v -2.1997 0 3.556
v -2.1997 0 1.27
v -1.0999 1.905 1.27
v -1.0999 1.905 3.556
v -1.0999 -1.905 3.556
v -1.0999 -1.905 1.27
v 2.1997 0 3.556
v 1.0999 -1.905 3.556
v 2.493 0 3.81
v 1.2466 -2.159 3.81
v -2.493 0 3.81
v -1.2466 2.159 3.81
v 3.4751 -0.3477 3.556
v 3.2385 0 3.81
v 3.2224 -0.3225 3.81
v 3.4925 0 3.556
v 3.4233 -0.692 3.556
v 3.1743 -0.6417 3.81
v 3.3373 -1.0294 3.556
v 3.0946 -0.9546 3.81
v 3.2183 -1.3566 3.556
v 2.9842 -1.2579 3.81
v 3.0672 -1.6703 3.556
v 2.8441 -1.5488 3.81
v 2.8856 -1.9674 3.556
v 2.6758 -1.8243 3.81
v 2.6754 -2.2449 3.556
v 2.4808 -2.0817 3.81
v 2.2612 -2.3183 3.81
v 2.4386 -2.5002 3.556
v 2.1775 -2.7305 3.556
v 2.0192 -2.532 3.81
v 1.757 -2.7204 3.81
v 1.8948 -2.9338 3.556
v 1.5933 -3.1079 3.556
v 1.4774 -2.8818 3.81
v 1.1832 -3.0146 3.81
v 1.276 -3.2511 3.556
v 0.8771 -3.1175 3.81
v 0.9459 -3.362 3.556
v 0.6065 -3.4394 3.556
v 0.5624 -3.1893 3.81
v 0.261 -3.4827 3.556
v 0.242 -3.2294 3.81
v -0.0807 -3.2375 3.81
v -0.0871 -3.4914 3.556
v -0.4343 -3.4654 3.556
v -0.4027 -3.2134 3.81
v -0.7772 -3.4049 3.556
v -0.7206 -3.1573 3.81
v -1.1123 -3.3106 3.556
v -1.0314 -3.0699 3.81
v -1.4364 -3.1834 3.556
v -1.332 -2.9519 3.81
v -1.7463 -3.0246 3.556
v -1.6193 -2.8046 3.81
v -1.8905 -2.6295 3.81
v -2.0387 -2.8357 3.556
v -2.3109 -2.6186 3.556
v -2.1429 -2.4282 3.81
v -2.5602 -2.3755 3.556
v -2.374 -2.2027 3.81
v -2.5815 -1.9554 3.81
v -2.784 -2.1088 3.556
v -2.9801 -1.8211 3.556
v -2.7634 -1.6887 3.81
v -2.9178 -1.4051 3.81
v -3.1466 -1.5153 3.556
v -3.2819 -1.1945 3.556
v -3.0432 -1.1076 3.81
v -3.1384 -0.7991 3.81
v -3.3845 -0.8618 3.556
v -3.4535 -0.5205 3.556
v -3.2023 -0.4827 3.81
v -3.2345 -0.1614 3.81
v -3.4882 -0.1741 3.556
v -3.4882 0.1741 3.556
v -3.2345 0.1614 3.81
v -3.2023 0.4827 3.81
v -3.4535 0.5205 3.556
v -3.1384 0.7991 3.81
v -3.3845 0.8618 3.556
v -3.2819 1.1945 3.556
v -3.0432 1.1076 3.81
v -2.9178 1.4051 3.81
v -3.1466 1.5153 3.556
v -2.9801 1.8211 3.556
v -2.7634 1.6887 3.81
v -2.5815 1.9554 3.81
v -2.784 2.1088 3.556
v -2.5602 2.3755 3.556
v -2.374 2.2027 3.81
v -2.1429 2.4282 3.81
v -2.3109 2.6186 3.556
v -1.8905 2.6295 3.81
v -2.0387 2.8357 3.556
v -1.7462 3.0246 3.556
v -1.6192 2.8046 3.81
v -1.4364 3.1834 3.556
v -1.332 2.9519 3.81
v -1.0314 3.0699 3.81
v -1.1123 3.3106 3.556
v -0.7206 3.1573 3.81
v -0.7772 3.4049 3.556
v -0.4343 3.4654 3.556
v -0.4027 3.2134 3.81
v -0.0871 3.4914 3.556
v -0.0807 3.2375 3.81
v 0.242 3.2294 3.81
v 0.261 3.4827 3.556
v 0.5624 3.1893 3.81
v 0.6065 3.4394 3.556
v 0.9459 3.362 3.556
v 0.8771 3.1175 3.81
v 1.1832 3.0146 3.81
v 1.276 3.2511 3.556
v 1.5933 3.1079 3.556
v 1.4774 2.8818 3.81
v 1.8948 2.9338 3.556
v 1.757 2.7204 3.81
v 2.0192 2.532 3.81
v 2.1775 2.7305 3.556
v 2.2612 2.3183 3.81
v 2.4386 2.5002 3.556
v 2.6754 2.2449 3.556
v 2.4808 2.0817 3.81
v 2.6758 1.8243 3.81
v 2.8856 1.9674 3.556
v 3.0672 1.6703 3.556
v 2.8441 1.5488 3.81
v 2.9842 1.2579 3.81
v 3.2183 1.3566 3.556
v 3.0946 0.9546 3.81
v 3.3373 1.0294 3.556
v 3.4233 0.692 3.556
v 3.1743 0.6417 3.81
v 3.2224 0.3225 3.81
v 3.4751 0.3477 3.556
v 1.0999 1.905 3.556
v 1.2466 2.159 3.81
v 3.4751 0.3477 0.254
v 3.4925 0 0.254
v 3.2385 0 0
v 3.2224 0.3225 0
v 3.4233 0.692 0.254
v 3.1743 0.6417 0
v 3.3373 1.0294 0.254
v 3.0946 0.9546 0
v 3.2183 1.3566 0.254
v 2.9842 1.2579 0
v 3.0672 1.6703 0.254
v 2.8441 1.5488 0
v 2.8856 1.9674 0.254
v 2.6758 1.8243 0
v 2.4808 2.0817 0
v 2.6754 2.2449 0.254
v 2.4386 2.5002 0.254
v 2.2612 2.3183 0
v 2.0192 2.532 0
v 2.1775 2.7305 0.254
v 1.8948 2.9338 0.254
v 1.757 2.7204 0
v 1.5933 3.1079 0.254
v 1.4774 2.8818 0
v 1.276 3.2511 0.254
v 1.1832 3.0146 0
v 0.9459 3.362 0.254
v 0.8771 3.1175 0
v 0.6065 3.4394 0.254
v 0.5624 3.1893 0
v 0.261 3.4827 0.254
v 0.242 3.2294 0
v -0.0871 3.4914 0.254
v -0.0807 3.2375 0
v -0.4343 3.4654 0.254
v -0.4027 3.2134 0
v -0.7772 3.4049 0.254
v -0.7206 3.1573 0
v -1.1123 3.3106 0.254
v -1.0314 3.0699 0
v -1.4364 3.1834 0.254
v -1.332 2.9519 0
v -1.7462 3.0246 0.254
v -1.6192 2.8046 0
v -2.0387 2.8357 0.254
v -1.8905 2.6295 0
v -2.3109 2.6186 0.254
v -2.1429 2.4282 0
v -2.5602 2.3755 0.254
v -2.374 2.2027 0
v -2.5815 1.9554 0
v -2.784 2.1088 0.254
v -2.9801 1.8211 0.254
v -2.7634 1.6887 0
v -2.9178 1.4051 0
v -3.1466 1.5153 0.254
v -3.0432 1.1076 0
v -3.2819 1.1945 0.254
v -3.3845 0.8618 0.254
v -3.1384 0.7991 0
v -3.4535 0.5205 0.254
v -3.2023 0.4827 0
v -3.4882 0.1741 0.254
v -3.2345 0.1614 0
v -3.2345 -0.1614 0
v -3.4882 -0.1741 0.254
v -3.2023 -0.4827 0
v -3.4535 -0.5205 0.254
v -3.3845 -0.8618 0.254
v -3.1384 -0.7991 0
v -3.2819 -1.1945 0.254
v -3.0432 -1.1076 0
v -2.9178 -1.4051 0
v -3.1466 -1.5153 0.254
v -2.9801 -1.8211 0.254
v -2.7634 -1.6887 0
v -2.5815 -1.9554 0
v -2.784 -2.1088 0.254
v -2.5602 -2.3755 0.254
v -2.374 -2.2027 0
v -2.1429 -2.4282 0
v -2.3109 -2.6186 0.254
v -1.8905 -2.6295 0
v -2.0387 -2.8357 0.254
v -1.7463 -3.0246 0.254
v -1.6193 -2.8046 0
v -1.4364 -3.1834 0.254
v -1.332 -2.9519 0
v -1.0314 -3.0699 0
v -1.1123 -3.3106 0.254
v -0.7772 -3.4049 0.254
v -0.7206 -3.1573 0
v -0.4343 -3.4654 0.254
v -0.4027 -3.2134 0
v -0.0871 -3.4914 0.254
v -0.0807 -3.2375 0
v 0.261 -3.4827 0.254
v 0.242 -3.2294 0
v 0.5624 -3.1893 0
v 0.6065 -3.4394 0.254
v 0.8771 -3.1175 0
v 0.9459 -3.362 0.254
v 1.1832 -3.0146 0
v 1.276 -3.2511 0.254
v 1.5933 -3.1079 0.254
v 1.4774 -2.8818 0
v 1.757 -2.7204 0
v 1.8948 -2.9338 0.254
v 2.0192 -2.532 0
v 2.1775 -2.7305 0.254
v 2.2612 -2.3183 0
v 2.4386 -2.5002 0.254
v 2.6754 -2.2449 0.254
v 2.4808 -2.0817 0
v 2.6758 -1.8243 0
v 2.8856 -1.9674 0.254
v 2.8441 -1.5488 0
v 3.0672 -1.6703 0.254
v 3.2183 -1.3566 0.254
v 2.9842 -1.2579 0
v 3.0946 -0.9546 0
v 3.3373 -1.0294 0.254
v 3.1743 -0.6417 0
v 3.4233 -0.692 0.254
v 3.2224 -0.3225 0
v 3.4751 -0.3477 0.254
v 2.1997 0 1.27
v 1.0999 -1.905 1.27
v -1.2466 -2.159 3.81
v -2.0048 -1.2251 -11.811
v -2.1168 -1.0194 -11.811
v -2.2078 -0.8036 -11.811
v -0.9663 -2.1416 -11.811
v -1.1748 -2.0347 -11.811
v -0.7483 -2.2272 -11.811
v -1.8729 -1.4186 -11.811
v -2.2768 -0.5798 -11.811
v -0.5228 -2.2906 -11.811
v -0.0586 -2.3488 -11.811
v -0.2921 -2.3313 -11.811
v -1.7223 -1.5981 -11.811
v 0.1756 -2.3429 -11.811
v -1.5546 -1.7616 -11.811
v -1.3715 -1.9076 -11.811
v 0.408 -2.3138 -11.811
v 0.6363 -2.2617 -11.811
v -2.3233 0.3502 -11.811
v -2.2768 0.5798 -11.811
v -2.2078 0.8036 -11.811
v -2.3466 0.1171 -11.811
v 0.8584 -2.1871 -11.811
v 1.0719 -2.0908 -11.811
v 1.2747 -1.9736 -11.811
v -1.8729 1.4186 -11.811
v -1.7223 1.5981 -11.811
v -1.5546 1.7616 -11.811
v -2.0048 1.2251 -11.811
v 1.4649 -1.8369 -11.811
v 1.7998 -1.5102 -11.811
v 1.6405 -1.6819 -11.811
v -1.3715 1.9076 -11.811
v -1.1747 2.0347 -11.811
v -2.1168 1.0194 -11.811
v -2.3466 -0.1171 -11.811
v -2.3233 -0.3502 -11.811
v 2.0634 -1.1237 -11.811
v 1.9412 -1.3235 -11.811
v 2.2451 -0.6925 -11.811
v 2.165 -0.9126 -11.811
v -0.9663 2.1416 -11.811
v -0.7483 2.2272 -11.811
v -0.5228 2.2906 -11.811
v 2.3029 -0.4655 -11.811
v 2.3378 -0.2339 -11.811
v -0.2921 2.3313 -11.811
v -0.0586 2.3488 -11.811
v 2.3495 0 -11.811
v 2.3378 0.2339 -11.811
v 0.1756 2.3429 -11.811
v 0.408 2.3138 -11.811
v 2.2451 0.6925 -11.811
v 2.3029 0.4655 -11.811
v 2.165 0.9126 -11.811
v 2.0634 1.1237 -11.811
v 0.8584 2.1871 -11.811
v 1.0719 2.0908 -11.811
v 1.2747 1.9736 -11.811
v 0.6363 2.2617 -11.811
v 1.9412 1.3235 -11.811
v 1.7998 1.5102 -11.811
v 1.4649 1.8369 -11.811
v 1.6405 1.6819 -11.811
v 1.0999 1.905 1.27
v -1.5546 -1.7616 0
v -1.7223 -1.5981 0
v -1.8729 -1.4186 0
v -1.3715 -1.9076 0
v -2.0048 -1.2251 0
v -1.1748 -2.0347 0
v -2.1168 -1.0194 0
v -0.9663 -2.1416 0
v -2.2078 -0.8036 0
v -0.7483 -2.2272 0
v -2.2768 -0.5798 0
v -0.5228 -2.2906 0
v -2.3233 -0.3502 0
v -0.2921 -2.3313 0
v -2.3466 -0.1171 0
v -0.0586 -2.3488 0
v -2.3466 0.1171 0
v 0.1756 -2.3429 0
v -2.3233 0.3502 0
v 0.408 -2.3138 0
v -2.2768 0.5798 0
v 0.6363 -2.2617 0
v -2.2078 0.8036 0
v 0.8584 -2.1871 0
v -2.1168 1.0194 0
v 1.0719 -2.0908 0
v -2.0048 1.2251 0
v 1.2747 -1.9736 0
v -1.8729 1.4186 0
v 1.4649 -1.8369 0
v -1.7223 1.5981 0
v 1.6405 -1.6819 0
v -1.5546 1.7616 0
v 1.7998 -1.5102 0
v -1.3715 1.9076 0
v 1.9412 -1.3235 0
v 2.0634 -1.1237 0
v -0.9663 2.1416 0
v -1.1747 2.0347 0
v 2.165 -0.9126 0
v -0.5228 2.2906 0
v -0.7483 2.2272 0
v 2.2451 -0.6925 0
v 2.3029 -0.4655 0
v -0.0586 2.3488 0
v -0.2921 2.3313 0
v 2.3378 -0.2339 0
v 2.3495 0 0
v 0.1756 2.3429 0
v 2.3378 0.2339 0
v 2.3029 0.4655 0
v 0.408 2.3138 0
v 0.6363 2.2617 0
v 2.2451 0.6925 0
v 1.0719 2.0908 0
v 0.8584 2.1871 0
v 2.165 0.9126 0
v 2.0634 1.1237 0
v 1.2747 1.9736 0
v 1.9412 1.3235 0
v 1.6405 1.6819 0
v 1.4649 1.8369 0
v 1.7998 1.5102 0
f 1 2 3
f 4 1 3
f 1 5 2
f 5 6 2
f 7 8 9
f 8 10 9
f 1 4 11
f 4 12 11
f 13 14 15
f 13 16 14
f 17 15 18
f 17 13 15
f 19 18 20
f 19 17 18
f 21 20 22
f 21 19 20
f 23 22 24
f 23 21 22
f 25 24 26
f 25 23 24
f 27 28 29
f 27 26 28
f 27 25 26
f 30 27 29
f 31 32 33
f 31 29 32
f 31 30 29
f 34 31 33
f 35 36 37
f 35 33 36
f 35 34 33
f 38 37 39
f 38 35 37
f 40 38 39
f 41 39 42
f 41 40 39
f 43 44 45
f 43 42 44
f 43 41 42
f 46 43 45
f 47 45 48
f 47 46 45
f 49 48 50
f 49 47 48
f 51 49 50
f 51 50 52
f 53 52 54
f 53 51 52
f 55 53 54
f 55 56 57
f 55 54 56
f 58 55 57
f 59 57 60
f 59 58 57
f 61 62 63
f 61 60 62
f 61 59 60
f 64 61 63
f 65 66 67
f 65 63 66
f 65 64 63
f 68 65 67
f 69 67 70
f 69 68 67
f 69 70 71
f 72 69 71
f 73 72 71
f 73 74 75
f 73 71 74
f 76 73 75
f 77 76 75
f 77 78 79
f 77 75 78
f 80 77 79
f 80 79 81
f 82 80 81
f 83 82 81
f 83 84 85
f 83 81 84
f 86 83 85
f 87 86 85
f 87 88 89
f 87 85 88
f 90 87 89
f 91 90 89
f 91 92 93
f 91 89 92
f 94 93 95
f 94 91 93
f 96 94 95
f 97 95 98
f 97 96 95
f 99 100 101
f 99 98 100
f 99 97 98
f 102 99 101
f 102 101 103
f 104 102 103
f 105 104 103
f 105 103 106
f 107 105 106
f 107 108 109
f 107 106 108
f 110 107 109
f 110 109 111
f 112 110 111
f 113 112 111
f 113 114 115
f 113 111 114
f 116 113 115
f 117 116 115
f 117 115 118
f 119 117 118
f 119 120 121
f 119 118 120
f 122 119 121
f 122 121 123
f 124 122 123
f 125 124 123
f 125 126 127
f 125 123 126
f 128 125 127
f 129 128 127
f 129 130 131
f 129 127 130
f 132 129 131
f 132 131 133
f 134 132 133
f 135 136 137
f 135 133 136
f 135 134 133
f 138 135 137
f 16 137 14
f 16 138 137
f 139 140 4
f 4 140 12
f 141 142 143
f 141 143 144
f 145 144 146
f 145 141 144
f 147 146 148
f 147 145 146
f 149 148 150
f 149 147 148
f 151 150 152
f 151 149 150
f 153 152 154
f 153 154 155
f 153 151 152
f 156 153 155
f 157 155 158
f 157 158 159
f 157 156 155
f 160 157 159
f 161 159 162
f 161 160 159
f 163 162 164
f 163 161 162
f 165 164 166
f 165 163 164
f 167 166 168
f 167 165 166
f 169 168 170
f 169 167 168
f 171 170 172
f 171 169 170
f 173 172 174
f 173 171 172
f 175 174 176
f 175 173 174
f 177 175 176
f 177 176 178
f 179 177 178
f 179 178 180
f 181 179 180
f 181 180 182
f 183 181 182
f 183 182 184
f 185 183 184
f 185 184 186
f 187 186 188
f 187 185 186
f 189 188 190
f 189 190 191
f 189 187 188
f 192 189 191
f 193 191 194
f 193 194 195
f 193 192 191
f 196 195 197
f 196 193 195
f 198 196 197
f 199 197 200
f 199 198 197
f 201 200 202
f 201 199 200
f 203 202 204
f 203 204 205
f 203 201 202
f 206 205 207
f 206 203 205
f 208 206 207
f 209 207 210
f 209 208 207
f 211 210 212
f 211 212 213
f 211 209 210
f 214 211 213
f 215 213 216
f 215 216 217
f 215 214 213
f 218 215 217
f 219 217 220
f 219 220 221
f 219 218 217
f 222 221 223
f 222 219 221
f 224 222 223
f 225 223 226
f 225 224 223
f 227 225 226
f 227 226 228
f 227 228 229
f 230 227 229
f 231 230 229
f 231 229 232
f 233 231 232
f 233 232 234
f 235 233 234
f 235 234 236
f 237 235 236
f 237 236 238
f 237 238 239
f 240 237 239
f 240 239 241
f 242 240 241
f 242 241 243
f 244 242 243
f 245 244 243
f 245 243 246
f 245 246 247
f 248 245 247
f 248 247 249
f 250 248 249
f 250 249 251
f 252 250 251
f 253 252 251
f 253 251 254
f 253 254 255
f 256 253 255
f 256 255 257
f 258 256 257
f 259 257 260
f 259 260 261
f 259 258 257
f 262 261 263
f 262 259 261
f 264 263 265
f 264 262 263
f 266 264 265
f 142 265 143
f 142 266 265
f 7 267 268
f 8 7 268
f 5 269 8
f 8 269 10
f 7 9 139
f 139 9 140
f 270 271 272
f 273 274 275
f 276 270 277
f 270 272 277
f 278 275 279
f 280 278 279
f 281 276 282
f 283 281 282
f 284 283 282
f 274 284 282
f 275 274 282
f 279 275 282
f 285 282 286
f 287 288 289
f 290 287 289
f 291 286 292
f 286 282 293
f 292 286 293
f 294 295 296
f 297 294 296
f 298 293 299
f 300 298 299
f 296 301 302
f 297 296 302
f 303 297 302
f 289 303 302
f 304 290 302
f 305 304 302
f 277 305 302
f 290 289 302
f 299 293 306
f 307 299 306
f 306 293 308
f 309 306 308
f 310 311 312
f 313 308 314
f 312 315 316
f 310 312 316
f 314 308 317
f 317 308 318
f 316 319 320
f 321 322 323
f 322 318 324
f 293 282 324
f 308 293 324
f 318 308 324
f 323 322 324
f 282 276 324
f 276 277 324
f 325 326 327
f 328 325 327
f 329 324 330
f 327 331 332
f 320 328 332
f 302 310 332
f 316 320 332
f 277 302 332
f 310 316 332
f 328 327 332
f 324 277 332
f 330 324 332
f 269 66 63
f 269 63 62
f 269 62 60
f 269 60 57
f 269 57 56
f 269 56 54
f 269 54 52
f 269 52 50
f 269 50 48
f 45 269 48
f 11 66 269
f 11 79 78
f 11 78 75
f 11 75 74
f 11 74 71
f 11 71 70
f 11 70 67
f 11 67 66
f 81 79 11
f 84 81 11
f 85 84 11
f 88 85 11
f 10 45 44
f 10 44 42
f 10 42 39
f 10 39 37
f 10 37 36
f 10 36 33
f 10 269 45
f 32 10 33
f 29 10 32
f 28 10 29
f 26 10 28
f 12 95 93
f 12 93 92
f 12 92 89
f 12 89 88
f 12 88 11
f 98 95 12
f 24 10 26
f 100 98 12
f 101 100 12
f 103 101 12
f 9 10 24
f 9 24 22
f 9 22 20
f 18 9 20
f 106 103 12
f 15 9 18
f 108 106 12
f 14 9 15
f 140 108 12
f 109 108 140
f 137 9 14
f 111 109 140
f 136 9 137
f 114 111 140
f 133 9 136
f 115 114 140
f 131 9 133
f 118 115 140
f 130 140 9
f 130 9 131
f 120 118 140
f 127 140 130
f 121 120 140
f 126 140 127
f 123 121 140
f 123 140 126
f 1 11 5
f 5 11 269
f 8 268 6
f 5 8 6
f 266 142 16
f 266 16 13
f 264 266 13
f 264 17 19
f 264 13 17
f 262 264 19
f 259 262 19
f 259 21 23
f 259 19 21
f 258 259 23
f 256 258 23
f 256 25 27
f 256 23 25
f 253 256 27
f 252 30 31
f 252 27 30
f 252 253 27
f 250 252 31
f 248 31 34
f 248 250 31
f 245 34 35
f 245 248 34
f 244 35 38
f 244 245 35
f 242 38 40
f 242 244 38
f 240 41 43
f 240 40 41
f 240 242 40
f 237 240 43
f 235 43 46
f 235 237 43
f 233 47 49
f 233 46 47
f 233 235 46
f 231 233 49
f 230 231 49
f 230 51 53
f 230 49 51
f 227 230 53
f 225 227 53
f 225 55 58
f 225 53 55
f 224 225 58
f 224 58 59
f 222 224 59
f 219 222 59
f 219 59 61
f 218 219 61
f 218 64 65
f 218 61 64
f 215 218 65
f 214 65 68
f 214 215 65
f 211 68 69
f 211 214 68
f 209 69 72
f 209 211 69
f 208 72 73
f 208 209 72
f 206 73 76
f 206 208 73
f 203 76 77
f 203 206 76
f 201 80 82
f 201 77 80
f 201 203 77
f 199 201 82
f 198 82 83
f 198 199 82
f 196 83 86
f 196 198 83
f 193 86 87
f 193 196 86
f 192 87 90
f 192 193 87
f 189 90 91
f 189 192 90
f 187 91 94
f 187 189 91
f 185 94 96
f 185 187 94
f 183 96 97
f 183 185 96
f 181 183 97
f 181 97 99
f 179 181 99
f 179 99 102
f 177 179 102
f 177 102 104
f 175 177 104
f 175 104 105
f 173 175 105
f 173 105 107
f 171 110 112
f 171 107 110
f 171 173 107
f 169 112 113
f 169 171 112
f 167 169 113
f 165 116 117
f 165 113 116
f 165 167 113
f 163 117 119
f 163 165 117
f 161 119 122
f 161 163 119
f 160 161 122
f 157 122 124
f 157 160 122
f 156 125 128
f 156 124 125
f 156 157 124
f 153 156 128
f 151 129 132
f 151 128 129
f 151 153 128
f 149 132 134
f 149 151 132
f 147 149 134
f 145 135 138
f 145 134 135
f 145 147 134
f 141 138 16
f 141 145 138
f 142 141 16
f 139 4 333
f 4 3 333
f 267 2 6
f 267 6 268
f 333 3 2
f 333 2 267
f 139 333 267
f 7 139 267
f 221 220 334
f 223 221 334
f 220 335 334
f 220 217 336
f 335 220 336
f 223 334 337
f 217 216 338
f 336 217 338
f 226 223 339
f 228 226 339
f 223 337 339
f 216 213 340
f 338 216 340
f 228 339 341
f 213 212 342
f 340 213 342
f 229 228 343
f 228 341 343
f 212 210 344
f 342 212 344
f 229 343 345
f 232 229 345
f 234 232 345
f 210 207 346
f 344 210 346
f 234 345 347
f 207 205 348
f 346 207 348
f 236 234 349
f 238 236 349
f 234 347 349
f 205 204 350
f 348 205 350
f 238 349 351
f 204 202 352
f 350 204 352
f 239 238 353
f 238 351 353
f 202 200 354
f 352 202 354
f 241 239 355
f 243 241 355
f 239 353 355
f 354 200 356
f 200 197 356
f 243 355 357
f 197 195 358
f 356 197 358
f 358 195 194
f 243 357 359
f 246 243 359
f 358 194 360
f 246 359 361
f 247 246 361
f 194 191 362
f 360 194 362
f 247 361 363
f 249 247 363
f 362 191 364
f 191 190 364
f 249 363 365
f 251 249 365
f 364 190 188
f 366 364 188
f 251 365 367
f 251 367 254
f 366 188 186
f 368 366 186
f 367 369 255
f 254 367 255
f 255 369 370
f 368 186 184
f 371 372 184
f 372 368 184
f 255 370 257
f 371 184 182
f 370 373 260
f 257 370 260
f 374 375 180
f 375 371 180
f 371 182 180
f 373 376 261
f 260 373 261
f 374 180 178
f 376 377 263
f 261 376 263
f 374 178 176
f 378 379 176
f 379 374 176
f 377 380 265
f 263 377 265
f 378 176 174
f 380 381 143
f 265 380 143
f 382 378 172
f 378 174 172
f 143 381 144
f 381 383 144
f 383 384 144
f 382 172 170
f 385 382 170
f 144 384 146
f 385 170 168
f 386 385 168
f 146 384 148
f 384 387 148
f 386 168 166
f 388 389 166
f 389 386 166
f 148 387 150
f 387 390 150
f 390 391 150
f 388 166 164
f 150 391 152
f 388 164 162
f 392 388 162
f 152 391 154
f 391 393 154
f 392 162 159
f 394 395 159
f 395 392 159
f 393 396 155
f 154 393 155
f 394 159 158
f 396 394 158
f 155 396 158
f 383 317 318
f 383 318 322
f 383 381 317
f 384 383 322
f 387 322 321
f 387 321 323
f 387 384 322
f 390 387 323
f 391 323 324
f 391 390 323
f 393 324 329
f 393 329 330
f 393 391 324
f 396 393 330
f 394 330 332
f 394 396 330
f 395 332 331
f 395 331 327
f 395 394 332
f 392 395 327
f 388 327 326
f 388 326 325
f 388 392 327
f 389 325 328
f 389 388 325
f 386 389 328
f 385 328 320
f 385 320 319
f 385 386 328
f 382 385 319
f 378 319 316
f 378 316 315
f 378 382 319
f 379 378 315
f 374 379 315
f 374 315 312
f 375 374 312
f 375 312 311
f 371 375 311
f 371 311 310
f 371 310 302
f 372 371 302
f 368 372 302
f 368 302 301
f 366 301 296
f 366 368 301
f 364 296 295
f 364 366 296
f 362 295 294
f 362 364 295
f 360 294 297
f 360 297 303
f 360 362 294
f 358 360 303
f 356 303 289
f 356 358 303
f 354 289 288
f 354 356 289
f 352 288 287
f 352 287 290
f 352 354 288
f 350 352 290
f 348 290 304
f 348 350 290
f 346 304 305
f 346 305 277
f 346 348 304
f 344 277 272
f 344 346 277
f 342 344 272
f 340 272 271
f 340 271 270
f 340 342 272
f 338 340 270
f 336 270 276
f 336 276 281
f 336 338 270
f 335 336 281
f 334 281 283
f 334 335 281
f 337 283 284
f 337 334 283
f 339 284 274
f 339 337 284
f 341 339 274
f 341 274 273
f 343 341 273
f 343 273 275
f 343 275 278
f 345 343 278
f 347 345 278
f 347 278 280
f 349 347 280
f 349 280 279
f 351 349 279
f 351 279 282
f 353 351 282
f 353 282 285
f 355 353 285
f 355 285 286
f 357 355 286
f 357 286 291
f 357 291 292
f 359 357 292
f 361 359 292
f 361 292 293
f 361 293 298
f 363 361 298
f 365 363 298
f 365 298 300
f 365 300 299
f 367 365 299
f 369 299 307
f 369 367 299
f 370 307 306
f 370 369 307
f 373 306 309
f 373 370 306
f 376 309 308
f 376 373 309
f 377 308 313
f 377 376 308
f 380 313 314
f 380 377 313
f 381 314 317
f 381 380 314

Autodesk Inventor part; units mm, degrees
ref_plane "YZ Plane" through (0, 0, 0) normal (1, 0, 0) x (0, 1, 0)
ref_plane "XZ Plane" through (0, 0, 0) normal (0, 1, 0) x (-1, 0, 0)
ref_plane "XY Plane" through (0, 0, 0) normal (0, 0, 1) x (1, 0, 0)
sketch "Sketch1" plane through (0, 0, 0) normal (0, 0, 1) x (1, 0, 0)
  circle A0 centre (0, 0) radius 3.4925
  circle A1 centre (0, 0) radius 2.3495
  line L0 (2.1997, 0) -> (1.0999, -1.905)
  line L1 (1.0999, -1.905) -> (-1.0999, -1.905)
  line L2 (-1.0999, -1.905) -> (-2.1997, 0)
  line L3 (-2.1997, 0) -> (-1.0999, 1.905)
  line L4 (-1.0999, 1.905) -> (1.0999, 1.905)
  line L5 (1.0999, 1.905) -> (2.1997, 0)
  dimension "d0" = 6.985
  dimension "d1" = 4.699
  dimension "d2" = 3.81
extrude "Extrusion1" add sketch "Sketch1" along normal blind 3.81 contours A0 | A1
extrude "Extrusion2" add sketch "Sketch1" against normal blind 11.811 contours A1 | L0 L1 L2 L3 L4 L5
extrude "Extrusion3" add sketch "Sketch1" along normal blind 1.27 contours L0 L1 L2 L3 L4 L5
thread "Thread1" size "10-32 UNF" class "2A" standard "ANSI Unified Screw Threads" full length
chamfer "Chamfer1" distance 0.254 angle 45 8 edges at (-3.4925, 0, 3.81) (-3.4925, 0, 0) (-1.6498, 0.9525, 3.81) (-1.6498, -0.9525, 3.81) (0, -1.905, 3.81) (1.6498, -0.9525, 3.81) (1.6498, 0.9525, 3.81) (0, 1.905, 3.81)
properties part number "Gearbox Hex Machine Screw 4" material "Steel"
